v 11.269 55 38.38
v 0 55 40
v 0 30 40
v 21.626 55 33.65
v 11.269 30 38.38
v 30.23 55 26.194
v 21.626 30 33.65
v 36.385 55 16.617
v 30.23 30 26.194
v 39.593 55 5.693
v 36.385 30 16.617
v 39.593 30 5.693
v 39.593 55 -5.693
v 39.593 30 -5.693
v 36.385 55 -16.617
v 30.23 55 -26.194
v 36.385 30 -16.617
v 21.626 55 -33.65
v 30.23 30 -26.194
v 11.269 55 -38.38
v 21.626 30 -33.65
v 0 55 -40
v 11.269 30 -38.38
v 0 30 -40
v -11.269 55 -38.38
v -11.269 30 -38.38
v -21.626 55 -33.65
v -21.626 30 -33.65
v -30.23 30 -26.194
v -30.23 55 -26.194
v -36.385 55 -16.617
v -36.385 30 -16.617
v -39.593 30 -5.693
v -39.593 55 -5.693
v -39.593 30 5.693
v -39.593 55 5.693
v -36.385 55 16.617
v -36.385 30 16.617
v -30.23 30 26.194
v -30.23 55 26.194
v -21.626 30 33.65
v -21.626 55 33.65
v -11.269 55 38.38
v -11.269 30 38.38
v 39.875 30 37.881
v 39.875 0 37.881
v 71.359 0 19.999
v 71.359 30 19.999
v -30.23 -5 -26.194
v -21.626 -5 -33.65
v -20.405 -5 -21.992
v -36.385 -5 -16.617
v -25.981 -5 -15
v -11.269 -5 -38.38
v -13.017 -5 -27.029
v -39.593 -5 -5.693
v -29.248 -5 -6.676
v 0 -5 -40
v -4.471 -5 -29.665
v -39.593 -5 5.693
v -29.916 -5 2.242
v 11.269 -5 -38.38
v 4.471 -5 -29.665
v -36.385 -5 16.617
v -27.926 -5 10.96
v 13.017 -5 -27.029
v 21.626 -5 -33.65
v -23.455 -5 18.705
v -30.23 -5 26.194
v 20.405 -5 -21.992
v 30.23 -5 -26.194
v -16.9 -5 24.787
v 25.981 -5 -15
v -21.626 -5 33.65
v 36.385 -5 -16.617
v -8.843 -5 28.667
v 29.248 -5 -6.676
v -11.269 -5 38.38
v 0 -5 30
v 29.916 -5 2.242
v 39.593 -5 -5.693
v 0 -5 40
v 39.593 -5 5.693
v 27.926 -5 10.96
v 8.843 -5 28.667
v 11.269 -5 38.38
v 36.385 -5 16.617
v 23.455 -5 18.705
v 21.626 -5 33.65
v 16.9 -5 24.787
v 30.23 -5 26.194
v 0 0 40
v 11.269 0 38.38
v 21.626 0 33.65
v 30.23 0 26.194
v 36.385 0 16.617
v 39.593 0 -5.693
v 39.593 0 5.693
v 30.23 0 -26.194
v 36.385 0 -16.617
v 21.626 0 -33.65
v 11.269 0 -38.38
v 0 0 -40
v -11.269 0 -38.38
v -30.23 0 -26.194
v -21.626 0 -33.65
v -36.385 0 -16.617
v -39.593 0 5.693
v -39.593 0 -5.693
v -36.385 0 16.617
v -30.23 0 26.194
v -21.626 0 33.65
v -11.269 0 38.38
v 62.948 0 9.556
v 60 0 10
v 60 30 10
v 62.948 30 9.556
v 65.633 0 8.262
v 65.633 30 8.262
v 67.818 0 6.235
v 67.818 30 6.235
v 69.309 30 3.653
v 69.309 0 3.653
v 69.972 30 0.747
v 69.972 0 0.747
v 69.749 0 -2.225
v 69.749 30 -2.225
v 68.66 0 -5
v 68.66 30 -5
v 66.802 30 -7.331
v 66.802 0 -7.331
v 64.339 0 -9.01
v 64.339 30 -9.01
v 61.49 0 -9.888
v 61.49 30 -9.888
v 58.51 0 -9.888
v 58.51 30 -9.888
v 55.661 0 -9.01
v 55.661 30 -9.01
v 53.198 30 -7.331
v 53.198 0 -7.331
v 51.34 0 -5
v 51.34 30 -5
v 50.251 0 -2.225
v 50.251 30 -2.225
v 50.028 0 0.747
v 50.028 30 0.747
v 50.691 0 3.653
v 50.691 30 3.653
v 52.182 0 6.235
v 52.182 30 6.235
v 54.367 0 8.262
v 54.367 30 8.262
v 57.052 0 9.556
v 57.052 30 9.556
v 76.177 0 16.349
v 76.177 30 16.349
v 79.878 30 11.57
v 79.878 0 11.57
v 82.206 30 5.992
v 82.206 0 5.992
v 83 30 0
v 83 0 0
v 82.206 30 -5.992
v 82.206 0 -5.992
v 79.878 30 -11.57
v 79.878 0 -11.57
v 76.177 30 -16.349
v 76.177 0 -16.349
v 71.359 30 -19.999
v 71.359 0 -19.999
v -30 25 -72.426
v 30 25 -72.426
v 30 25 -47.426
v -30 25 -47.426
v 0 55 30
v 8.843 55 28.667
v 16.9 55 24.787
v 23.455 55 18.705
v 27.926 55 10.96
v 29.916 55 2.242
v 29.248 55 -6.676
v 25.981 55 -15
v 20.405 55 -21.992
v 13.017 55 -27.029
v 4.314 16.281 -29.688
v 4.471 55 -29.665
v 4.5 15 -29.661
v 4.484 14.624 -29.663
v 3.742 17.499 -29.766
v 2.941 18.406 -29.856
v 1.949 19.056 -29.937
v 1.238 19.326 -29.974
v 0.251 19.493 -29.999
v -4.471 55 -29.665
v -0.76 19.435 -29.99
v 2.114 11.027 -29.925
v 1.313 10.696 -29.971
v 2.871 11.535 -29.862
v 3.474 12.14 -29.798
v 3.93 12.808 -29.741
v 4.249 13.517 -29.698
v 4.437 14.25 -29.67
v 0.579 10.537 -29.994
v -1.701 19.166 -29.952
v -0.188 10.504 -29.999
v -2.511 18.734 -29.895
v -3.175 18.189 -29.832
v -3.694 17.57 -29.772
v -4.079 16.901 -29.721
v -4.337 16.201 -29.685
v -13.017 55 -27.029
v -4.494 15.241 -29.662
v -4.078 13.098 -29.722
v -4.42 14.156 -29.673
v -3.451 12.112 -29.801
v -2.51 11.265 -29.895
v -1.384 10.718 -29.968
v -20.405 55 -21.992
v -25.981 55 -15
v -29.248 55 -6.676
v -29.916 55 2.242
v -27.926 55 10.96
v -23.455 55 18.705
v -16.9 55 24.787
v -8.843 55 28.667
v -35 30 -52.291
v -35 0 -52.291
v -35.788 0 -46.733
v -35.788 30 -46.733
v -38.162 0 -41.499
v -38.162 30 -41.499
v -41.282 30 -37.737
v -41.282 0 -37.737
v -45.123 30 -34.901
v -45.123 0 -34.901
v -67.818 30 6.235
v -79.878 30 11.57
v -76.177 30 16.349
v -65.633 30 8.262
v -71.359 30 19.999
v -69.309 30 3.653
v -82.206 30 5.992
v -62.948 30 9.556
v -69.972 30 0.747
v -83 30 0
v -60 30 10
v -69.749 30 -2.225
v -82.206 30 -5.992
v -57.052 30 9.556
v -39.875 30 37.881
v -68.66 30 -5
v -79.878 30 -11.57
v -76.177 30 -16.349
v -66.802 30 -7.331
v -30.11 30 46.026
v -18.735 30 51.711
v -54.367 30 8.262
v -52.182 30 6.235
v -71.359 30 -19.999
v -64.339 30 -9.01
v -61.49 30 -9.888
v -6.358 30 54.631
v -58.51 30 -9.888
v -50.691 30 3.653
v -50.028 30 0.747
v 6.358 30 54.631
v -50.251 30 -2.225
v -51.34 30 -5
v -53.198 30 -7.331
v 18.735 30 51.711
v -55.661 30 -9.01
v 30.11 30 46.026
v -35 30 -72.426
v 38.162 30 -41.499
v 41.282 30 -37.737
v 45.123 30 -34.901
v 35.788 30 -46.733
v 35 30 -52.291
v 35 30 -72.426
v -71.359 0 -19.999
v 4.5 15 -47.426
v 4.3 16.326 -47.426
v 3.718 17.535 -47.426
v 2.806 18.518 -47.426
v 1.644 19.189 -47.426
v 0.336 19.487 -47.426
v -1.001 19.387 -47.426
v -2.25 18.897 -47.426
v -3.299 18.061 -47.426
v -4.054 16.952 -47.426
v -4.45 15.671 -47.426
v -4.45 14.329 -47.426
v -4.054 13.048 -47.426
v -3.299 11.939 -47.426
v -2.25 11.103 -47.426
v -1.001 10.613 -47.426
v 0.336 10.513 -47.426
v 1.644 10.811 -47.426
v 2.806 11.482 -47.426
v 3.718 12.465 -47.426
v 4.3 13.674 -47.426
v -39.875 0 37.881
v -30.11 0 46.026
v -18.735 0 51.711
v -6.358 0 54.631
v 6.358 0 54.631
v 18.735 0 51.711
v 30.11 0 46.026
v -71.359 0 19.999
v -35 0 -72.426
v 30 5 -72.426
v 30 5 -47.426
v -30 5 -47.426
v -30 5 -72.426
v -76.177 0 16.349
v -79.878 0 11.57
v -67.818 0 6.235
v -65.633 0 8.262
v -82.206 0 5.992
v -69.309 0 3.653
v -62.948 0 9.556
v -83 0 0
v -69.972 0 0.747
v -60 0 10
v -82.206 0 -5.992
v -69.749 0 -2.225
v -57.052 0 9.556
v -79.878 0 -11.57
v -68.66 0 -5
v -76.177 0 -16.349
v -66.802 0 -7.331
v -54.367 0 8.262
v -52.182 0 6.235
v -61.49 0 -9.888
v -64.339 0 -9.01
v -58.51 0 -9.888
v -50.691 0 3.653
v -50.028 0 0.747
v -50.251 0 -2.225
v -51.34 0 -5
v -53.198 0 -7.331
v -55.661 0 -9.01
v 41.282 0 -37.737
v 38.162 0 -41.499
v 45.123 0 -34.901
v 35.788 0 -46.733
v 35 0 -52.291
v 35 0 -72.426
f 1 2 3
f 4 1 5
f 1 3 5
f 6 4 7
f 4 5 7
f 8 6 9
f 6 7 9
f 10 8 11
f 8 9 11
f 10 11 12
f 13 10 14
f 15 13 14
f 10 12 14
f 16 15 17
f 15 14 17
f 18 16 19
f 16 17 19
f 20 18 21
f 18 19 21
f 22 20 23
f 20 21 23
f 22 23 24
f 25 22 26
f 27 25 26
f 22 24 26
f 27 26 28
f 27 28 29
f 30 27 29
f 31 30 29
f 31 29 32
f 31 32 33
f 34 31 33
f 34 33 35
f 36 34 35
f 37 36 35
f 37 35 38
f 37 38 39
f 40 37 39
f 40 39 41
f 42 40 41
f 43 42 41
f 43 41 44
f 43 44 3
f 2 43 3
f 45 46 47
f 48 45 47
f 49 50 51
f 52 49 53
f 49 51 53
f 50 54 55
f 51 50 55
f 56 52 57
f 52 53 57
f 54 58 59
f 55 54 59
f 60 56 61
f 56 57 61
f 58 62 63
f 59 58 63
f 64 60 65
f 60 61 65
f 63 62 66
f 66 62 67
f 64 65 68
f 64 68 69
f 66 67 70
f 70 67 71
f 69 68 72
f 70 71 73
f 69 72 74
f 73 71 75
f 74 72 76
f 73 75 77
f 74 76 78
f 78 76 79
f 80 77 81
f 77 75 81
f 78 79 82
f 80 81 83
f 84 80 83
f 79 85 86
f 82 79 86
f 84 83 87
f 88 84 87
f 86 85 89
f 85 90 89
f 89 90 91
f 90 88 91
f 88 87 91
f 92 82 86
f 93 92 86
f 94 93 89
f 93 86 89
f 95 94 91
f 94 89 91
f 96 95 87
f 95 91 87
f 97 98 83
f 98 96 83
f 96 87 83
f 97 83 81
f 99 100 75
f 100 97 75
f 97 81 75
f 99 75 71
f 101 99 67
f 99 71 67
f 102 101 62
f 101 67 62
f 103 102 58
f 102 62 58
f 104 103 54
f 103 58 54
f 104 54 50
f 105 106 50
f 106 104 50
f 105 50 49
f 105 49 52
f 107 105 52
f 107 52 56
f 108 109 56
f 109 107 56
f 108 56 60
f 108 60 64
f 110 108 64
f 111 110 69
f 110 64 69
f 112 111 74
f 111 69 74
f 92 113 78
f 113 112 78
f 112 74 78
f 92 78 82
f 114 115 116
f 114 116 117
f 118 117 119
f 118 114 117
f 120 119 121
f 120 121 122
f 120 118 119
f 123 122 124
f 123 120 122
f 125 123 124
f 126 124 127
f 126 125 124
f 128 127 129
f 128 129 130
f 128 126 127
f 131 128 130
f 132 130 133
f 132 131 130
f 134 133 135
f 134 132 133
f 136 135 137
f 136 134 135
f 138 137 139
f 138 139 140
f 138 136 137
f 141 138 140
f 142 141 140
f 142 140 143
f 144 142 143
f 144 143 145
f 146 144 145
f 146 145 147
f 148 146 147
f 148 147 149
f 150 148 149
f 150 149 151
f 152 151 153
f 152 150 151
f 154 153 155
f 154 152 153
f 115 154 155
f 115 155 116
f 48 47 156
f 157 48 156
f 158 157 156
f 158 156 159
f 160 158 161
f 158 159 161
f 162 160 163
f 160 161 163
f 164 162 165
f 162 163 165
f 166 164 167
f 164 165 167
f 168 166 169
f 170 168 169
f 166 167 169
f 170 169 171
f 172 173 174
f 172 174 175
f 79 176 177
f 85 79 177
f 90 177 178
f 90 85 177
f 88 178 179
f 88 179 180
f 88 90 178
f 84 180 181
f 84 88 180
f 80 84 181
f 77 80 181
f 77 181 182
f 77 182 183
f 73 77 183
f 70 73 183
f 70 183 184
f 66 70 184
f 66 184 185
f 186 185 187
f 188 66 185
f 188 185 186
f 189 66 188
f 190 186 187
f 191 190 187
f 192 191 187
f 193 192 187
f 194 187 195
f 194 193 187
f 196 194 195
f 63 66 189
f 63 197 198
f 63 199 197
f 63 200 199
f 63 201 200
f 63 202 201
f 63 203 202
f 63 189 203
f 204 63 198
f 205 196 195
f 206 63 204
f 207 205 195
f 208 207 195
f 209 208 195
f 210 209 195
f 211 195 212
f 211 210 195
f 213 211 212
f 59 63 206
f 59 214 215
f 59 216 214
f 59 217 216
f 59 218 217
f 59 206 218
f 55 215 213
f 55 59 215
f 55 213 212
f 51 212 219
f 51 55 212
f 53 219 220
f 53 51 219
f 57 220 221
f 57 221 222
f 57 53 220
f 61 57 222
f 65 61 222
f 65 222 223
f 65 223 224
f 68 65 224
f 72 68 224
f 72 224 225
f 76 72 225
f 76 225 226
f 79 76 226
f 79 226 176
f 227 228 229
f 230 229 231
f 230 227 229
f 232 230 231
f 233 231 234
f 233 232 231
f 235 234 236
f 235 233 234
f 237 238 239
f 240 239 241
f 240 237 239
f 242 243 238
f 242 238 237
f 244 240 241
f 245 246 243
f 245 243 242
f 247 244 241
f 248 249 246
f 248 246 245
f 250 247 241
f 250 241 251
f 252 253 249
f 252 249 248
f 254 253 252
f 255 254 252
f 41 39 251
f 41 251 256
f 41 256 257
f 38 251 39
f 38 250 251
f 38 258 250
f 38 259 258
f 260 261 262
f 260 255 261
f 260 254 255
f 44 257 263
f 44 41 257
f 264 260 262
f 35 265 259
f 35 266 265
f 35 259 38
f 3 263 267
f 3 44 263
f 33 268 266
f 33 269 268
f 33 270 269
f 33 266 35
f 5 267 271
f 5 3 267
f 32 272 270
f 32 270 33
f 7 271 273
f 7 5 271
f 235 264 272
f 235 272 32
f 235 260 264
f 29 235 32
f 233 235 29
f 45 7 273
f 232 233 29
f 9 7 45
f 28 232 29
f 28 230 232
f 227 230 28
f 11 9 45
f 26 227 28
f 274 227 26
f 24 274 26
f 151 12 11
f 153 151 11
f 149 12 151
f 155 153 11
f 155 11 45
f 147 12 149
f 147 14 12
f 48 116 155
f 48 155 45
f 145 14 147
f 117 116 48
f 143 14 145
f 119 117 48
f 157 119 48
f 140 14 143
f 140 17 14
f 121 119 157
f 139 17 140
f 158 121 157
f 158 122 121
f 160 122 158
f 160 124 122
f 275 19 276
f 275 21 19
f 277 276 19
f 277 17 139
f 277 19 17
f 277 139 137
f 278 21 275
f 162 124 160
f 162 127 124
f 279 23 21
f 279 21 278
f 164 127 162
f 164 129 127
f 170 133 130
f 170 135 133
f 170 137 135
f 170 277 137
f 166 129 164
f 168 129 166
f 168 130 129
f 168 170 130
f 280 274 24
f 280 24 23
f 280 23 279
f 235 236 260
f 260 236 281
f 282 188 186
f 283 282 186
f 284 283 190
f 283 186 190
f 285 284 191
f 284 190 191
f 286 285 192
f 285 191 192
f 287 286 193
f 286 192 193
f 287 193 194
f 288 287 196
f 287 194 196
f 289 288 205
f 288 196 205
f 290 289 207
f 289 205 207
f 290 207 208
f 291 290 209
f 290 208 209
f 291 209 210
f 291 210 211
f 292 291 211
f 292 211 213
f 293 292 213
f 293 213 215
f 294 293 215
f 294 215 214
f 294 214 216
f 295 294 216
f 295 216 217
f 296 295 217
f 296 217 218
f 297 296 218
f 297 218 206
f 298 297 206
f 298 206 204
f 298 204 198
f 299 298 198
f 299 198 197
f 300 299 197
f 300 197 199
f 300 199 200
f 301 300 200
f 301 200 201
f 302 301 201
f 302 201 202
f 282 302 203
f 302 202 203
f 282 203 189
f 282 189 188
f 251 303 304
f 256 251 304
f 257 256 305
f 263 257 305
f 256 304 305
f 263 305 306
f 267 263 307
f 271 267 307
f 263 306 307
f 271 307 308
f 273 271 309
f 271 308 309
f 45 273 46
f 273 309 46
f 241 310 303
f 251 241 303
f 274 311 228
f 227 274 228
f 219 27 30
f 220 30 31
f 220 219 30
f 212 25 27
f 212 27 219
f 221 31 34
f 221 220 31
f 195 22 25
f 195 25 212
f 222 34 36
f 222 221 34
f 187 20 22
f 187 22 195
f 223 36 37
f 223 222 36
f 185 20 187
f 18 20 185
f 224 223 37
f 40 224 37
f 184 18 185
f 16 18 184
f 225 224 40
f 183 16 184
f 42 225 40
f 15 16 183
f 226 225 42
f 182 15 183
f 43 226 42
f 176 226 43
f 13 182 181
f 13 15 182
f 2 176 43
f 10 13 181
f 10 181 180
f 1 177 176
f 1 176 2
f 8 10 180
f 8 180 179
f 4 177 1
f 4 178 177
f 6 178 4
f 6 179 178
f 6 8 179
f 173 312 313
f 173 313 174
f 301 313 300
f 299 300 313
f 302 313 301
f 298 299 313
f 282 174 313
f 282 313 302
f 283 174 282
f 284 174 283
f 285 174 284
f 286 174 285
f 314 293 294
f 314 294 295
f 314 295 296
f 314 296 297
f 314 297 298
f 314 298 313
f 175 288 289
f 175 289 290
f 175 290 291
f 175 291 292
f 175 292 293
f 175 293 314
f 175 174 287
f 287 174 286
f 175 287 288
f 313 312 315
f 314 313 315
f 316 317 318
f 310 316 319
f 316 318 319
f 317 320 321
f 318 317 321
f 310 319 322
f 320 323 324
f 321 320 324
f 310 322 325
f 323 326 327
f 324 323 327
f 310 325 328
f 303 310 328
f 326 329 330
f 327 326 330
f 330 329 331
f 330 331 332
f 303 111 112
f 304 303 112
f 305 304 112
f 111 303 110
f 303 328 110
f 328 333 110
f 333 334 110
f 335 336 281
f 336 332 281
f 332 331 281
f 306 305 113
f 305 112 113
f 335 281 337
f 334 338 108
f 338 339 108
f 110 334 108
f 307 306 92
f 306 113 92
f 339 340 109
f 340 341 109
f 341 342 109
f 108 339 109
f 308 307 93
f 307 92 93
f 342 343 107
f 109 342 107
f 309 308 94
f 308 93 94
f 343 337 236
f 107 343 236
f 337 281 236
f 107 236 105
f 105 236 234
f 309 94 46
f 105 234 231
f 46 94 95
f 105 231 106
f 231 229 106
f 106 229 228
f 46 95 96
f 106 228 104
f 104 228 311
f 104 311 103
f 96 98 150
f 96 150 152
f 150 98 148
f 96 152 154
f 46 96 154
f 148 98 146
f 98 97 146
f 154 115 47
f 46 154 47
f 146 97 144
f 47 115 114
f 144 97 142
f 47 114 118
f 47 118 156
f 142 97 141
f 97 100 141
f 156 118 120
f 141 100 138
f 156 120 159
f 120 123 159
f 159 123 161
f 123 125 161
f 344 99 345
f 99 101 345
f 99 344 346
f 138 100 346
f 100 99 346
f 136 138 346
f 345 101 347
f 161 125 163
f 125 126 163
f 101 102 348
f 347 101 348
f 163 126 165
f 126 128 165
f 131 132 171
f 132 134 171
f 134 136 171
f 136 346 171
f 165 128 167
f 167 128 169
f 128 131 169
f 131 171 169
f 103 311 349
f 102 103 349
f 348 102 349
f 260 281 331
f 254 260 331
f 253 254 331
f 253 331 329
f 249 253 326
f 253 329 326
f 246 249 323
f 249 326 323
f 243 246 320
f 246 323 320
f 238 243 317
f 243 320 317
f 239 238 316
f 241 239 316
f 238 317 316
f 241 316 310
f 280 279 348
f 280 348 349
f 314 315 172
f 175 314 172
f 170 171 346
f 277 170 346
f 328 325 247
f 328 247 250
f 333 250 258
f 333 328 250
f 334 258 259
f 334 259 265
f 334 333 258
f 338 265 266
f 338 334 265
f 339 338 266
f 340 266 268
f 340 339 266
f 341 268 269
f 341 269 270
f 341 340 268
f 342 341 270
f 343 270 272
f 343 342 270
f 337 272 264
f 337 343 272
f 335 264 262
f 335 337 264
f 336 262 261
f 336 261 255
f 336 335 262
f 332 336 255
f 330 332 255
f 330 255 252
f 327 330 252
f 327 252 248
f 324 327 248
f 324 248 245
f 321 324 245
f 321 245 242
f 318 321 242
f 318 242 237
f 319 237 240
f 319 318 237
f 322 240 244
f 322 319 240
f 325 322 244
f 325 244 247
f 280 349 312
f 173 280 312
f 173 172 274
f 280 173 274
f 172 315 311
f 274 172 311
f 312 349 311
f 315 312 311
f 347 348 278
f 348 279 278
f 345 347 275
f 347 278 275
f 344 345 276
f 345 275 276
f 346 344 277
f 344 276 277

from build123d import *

# Parameters (mm, degrees)
BOSS_EXTRUDE1_DEPTH        = 55
BOSS_EXTRUDE1_DEPTH_BACK   = 5
SKETCH1_R                  = 40
SKETCH1_R_2                = 30
SKETCH2_R                  = 10
SKETCH2_R_2                = 30
BOSS_EXTRUDE2_DEPTH        = 30
FILLET1_R                  = 20
SKETCH3_W                  = 60
SKETCH3_H                  = 20
CUT_EXTRUDE1_DEPTH         = 25
M10X1_0_TAPPED_HOLE1_D     = 9
M10X1_0_TAPPED_HOLE1_DEPTH = 43
M10X1_0_TAPPED_HOLE1_TIP   = 2.703872786


with BuildPart() as part:
    # Sketch1 → Boss-Extrude1 (new, two sides: drawn at the far end of the back side and taken through both)
    with BuildSketch(Plane(origin=(0, 0, 0), x_dir=(1, 0, 0), z_dir=(0, 1, 0)).offset(-BOSS_EXTRUDE1_DEPTH_BACK)):
        with Locations(Location((0, 0, 0), (0, 0, 270))):
            Circle(SKETCH1_R)
        with Locations(Location((0, 0, 0), (0, 0, 270))):
            Circle(SKETCH1_R_2, mode=Mode.SUBTRACT)
    extrude(amount=BOSS_EXTRUDE1_DEPTH + BOSS_EXTRUDE1_DEPTH_BACK)

    # Sketch2 → Boss-Extrude2 (add)
    with BuildSketch(Plane(origin=(0, 0, 0), x_dir=(1, 0, 0), z_dir=(0, 1, 0))):
        with BuildLine():
            Line((39.875, -37.881187613), (71.35896205, -19.999349518))
            ThreePointArc((71.35896205, -19.999349518), (83, 0), (71.35896205, 19.999349518))
            Line((71.35896205, 19.999349518), (39.875, 37.881187613))
            Line((39.875, 37.881187613), (35, 40.650024667))
            Line((35, 40.650024667), (35, 72.426406871))
            Line((35, 72.426406871), (-35, 72.426406871))
            Line((-35, 72.426406871), (-35, 40.650024667))
            Line((-35, 40.650024667), (-39.875, 37.881187613))
            Line((-39.875, 37.881187613), (-71.35896205, 19.999349518))
            ThreePointArc((-71.35896205, 19.999349518), (-83, 0), (-71.35896205, -19.999349518))
            Line((-71.35896205, -19.999349518), (-39.875, -37.881187613))
            ThreePointArc((-39.875, -37.881187613), (0, -55), (39.875, -37.881187613))
        make_face()
        with Locations(Location((-60, 0, 0), (0, 0, 270))):
            Circle(SKETCH2_R, mode=Mode.SUBTRACT)
        with Locations(Location((0, 0, 0), (0, 0, 270))):
            Circle(SKETCH2_R_2, mode=Mode.SUBTRACT)
        with Locations(Location((60, 0, 0), (0, 0, 270))):
            Circle(SKETCH2_R, mode=Mode.SUBTRACT)
    extrude(amount=BOSS_EXTRUDE2_DEPTH)

    # Fillet1
    fillet1_edges = [part.edges().sort_by_distance(p)[0] for p in [
        (35, 15, -40.650024667),
        (-35, 15, -40.650024667),
    ]]
    fillet(fillet1_edges, radius=FILLET1_R)

    # Sketch3 → Cut-Extrude1 (cut)
    with BuildSketch(Plane(origin=(0, 0, -72.426406871), x_dir=(-1, 0, 0), z_dir=(0, 0, -1))):
        with Locations((0, 15)):
            Rectangle(SKETCH3_W, SKETCH3_H)
    extrude(amount=-CUT_EXTRUDE1_DEPTH, mode=Mode.SUBTRACT)

    # M10x1.0 Tapped Hole1
    with Locations(Plane(origin=(0, 15, -47.426406871), x_dir=(-1, 0, 0), z_dir=(0, 0, -1))):
        with Locations((0, 0)):
            Hole(M10X1_0_TAPPED_HOLE1_D / 2, depth=M10X1_0_TAPPED_HOLE1_DEPTH)
            with Locations((0, 0, -(M10X1_0_TAPPED_HOLE1_DEPTH + M10X1_0_TAPPED_HOLE1_TIP / 2))):  # 118° drill point
                Cone(0, M10X1_0_TAPPED_HOLE1_D / 2, M10X1_0_TAPPED_HOLE1_TIP, mode=Mode.SUBTRACT)


solid = part.part
